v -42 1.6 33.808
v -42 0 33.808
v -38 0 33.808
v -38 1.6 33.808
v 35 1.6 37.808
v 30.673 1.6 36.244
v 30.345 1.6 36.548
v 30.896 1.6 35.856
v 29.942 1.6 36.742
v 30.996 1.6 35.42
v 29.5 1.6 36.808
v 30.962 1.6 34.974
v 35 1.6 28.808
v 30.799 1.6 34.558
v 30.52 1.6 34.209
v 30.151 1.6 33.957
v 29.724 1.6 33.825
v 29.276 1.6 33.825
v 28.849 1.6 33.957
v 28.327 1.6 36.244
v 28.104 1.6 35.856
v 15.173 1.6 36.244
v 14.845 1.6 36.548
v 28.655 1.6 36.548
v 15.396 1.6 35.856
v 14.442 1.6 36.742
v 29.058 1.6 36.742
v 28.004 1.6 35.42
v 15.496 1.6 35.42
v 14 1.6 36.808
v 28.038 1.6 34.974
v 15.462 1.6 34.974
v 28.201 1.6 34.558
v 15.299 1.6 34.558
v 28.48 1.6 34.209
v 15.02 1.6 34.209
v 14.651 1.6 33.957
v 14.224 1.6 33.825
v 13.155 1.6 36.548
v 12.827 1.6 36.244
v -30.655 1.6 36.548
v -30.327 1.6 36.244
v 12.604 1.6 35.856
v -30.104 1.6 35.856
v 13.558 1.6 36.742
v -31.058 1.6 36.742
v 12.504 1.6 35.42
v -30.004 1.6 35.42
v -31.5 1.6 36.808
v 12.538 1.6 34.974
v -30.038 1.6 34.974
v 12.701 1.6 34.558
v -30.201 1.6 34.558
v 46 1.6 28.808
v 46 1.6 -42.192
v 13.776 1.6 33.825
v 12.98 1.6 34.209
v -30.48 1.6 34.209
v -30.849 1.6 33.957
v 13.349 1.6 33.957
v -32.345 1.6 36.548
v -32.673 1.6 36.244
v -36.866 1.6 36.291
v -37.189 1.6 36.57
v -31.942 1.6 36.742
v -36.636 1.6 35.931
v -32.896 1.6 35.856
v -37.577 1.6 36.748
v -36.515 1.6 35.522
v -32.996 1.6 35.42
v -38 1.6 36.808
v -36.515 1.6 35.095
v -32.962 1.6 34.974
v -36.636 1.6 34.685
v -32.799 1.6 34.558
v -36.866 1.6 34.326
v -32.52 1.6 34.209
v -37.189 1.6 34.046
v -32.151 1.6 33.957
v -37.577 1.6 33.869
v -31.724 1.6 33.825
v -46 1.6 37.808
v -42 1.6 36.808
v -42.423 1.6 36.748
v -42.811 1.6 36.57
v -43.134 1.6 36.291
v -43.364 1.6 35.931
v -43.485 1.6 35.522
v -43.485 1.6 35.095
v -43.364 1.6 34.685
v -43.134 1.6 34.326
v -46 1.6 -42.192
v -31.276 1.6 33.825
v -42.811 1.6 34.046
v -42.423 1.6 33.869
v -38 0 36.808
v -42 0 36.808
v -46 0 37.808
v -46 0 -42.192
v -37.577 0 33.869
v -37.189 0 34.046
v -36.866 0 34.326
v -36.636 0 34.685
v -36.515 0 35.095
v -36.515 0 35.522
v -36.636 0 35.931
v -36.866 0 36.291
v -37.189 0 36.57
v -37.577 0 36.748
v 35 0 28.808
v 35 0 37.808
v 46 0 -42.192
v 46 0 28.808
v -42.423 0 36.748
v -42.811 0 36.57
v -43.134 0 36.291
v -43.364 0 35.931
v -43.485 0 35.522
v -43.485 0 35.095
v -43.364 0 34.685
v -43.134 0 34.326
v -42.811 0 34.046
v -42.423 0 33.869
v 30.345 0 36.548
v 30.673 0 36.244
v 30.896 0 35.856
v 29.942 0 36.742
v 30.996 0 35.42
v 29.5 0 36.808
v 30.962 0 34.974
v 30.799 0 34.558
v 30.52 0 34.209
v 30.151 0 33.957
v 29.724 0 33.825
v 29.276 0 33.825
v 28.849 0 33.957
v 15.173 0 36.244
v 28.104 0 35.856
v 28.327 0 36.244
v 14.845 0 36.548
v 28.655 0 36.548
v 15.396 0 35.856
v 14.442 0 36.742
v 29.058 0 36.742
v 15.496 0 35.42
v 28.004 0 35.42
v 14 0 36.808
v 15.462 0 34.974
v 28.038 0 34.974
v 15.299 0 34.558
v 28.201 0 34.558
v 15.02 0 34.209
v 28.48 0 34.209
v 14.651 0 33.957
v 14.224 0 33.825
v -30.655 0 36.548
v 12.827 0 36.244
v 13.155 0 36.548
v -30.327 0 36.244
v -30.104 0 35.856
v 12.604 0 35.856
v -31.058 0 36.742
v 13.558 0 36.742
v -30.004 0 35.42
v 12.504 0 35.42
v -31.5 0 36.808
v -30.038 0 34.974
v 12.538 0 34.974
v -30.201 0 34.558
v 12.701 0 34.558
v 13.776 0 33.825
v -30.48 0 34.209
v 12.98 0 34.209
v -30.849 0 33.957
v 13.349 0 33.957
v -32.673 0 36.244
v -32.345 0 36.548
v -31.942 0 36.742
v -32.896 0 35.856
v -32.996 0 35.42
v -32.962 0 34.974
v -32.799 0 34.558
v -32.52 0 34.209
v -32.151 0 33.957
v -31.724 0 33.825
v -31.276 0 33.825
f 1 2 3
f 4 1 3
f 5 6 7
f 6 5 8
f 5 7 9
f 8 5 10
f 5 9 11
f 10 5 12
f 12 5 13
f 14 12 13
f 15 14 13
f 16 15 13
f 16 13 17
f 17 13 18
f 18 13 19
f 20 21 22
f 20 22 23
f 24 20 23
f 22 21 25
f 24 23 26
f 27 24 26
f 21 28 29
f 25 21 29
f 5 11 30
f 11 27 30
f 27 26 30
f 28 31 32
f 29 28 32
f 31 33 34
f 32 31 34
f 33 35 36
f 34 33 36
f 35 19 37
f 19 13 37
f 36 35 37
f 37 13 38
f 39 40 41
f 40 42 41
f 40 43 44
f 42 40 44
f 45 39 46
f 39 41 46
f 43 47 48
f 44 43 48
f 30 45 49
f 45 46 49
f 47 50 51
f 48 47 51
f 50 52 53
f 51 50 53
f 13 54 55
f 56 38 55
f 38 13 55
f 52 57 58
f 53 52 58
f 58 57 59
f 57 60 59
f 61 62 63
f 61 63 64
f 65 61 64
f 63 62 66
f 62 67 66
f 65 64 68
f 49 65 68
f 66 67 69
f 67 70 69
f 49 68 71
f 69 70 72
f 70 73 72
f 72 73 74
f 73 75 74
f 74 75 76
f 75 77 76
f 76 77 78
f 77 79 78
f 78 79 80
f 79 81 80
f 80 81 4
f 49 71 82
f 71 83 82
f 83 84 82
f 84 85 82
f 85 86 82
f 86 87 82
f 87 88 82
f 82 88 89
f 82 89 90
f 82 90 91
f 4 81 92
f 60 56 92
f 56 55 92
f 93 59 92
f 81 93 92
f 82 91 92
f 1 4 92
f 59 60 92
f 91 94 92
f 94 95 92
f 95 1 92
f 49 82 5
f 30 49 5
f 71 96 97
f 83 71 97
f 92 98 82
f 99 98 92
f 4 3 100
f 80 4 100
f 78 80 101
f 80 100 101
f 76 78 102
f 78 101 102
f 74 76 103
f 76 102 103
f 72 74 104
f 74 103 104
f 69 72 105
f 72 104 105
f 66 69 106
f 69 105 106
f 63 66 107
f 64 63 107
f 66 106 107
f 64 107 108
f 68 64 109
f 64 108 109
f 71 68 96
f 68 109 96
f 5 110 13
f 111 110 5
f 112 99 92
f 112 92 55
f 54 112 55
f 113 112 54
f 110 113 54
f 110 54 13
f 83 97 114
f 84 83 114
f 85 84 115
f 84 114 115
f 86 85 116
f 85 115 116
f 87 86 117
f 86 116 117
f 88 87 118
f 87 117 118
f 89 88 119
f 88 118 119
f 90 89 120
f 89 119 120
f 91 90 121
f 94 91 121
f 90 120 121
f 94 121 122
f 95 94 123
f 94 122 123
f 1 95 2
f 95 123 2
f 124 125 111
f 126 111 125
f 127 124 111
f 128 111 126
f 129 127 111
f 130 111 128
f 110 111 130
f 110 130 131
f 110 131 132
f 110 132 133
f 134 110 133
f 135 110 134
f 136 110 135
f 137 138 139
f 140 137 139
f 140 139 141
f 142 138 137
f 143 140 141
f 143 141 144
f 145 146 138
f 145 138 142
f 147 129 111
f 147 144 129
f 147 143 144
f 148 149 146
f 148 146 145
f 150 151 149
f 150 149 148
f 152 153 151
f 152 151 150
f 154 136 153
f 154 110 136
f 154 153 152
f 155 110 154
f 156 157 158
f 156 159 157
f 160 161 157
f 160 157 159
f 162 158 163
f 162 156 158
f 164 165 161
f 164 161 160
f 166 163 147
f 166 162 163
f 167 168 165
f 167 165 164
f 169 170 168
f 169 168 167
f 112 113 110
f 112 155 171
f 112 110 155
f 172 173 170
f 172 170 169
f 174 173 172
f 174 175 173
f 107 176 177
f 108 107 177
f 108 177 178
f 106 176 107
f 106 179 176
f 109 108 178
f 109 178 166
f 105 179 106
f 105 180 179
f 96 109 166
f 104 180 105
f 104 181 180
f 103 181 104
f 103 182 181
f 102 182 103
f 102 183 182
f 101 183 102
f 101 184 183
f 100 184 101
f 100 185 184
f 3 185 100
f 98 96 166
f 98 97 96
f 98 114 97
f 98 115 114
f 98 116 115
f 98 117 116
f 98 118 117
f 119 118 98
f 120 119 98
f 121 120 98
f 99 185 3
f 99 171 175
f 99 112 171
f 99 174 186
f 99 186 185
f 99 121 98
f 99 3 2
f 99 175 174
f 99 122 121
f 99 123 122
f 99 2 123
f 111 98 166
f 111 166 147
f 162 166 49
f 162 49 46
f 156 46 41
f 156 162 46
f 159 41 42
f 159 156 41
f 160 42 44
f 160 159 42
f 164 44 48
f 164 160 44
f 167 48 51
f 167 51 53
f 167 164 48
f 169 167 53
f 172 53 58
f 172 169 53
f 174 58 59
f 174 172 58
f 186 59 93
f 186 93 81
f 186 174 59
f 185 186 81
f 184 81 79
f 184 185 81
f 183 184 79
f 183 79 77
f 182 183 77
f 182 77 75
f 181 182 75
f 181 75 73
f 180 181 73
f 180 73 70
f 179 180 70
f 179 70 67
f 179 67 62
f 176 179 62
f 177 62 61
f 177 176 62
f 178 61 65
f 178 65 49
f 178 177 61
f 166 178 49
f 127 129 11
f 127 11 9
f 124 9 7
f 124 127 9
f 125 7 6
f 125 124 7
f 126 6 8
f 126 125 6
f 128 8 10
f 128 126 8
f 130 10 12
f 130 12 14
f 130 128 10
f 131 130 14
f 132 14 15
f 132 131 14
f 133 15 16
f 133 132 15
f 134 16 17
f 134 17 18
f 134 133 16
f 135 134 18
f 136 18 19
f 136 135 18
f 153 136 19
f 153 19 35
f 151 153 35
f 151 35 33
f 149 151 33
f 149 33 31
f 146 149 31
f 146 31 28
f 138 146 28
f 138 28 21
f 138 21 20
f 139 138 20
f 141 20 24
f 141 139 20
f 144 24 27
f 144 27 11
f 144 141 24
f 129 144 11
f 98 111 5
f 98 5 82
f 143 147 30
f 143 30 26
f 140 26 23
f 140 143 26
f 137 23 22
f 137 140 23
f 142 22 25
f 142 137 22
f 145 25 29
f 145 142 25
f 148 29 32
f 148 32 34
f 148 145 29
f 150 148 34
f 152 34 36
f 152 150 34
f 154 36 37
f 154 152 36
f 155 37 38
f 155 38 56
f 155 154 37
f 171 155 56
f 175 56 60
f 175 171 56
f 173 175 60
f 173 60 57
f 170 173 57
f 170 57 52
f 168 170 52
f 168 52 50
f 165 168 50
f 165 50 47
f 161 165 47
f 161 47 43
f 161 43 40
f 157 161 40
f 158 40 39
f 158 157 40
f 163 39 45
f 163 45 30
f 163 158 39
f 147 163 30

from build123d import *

# Parameters (mm, degrees)
SKETCH1_R           = 1.5
BOSS_EXTRUDE1_DEPTH = 1.6


with BuildPart() as part:
    # Sketch1 → Boss-Extrude1 (new body)
    with BuildSketch(Plane(origin=(0, 0, 0), x_dir=(1, 0, 0), z_dir=(0, 1, 0))):
        Polygon((46, -28.808269535), (35, -28.808269535), (35, -37.808269535), (-46, -37.808269535), (-46, 42.191730465), (46, 42.191730465), align=None)
        with Locations(Location((29.5, -35.308269535, 0), (0, 0, 270))):
            Circle(SKETCH1_R, mode=Mode.SUBTRACT)
        with Locations(Location((14, -35.308269535, 0), (0, 0, 270))):
            Circle(SKETCH1_R, mode=Mode.SUBTRACT)
        with Locations(Location((-31.5, -35.308269535, 0), (0, 0, 270))):
            Circle(SKETCH1_R, mode=Mode.SUBTRACT)
        with BuildLine():
            Line((-38, -36.808269535), (-42, -36.808269535))
            ThreePointArc((-42, -36.808269535), (-43.5, -35.308269535), (-42, -33.808269535))
            Line((-42, -33.808269535), (-38, -33.808269535))
            ThreePointArc((-38, -33.808269535), (-36.5, -35.308269535), (-38, -36.808269535))
        make_face(mode=Mode.SUBTRACT)
    extrude(amount=BOSS_EXTRUDE1_DEPTH)


solid = part.part
